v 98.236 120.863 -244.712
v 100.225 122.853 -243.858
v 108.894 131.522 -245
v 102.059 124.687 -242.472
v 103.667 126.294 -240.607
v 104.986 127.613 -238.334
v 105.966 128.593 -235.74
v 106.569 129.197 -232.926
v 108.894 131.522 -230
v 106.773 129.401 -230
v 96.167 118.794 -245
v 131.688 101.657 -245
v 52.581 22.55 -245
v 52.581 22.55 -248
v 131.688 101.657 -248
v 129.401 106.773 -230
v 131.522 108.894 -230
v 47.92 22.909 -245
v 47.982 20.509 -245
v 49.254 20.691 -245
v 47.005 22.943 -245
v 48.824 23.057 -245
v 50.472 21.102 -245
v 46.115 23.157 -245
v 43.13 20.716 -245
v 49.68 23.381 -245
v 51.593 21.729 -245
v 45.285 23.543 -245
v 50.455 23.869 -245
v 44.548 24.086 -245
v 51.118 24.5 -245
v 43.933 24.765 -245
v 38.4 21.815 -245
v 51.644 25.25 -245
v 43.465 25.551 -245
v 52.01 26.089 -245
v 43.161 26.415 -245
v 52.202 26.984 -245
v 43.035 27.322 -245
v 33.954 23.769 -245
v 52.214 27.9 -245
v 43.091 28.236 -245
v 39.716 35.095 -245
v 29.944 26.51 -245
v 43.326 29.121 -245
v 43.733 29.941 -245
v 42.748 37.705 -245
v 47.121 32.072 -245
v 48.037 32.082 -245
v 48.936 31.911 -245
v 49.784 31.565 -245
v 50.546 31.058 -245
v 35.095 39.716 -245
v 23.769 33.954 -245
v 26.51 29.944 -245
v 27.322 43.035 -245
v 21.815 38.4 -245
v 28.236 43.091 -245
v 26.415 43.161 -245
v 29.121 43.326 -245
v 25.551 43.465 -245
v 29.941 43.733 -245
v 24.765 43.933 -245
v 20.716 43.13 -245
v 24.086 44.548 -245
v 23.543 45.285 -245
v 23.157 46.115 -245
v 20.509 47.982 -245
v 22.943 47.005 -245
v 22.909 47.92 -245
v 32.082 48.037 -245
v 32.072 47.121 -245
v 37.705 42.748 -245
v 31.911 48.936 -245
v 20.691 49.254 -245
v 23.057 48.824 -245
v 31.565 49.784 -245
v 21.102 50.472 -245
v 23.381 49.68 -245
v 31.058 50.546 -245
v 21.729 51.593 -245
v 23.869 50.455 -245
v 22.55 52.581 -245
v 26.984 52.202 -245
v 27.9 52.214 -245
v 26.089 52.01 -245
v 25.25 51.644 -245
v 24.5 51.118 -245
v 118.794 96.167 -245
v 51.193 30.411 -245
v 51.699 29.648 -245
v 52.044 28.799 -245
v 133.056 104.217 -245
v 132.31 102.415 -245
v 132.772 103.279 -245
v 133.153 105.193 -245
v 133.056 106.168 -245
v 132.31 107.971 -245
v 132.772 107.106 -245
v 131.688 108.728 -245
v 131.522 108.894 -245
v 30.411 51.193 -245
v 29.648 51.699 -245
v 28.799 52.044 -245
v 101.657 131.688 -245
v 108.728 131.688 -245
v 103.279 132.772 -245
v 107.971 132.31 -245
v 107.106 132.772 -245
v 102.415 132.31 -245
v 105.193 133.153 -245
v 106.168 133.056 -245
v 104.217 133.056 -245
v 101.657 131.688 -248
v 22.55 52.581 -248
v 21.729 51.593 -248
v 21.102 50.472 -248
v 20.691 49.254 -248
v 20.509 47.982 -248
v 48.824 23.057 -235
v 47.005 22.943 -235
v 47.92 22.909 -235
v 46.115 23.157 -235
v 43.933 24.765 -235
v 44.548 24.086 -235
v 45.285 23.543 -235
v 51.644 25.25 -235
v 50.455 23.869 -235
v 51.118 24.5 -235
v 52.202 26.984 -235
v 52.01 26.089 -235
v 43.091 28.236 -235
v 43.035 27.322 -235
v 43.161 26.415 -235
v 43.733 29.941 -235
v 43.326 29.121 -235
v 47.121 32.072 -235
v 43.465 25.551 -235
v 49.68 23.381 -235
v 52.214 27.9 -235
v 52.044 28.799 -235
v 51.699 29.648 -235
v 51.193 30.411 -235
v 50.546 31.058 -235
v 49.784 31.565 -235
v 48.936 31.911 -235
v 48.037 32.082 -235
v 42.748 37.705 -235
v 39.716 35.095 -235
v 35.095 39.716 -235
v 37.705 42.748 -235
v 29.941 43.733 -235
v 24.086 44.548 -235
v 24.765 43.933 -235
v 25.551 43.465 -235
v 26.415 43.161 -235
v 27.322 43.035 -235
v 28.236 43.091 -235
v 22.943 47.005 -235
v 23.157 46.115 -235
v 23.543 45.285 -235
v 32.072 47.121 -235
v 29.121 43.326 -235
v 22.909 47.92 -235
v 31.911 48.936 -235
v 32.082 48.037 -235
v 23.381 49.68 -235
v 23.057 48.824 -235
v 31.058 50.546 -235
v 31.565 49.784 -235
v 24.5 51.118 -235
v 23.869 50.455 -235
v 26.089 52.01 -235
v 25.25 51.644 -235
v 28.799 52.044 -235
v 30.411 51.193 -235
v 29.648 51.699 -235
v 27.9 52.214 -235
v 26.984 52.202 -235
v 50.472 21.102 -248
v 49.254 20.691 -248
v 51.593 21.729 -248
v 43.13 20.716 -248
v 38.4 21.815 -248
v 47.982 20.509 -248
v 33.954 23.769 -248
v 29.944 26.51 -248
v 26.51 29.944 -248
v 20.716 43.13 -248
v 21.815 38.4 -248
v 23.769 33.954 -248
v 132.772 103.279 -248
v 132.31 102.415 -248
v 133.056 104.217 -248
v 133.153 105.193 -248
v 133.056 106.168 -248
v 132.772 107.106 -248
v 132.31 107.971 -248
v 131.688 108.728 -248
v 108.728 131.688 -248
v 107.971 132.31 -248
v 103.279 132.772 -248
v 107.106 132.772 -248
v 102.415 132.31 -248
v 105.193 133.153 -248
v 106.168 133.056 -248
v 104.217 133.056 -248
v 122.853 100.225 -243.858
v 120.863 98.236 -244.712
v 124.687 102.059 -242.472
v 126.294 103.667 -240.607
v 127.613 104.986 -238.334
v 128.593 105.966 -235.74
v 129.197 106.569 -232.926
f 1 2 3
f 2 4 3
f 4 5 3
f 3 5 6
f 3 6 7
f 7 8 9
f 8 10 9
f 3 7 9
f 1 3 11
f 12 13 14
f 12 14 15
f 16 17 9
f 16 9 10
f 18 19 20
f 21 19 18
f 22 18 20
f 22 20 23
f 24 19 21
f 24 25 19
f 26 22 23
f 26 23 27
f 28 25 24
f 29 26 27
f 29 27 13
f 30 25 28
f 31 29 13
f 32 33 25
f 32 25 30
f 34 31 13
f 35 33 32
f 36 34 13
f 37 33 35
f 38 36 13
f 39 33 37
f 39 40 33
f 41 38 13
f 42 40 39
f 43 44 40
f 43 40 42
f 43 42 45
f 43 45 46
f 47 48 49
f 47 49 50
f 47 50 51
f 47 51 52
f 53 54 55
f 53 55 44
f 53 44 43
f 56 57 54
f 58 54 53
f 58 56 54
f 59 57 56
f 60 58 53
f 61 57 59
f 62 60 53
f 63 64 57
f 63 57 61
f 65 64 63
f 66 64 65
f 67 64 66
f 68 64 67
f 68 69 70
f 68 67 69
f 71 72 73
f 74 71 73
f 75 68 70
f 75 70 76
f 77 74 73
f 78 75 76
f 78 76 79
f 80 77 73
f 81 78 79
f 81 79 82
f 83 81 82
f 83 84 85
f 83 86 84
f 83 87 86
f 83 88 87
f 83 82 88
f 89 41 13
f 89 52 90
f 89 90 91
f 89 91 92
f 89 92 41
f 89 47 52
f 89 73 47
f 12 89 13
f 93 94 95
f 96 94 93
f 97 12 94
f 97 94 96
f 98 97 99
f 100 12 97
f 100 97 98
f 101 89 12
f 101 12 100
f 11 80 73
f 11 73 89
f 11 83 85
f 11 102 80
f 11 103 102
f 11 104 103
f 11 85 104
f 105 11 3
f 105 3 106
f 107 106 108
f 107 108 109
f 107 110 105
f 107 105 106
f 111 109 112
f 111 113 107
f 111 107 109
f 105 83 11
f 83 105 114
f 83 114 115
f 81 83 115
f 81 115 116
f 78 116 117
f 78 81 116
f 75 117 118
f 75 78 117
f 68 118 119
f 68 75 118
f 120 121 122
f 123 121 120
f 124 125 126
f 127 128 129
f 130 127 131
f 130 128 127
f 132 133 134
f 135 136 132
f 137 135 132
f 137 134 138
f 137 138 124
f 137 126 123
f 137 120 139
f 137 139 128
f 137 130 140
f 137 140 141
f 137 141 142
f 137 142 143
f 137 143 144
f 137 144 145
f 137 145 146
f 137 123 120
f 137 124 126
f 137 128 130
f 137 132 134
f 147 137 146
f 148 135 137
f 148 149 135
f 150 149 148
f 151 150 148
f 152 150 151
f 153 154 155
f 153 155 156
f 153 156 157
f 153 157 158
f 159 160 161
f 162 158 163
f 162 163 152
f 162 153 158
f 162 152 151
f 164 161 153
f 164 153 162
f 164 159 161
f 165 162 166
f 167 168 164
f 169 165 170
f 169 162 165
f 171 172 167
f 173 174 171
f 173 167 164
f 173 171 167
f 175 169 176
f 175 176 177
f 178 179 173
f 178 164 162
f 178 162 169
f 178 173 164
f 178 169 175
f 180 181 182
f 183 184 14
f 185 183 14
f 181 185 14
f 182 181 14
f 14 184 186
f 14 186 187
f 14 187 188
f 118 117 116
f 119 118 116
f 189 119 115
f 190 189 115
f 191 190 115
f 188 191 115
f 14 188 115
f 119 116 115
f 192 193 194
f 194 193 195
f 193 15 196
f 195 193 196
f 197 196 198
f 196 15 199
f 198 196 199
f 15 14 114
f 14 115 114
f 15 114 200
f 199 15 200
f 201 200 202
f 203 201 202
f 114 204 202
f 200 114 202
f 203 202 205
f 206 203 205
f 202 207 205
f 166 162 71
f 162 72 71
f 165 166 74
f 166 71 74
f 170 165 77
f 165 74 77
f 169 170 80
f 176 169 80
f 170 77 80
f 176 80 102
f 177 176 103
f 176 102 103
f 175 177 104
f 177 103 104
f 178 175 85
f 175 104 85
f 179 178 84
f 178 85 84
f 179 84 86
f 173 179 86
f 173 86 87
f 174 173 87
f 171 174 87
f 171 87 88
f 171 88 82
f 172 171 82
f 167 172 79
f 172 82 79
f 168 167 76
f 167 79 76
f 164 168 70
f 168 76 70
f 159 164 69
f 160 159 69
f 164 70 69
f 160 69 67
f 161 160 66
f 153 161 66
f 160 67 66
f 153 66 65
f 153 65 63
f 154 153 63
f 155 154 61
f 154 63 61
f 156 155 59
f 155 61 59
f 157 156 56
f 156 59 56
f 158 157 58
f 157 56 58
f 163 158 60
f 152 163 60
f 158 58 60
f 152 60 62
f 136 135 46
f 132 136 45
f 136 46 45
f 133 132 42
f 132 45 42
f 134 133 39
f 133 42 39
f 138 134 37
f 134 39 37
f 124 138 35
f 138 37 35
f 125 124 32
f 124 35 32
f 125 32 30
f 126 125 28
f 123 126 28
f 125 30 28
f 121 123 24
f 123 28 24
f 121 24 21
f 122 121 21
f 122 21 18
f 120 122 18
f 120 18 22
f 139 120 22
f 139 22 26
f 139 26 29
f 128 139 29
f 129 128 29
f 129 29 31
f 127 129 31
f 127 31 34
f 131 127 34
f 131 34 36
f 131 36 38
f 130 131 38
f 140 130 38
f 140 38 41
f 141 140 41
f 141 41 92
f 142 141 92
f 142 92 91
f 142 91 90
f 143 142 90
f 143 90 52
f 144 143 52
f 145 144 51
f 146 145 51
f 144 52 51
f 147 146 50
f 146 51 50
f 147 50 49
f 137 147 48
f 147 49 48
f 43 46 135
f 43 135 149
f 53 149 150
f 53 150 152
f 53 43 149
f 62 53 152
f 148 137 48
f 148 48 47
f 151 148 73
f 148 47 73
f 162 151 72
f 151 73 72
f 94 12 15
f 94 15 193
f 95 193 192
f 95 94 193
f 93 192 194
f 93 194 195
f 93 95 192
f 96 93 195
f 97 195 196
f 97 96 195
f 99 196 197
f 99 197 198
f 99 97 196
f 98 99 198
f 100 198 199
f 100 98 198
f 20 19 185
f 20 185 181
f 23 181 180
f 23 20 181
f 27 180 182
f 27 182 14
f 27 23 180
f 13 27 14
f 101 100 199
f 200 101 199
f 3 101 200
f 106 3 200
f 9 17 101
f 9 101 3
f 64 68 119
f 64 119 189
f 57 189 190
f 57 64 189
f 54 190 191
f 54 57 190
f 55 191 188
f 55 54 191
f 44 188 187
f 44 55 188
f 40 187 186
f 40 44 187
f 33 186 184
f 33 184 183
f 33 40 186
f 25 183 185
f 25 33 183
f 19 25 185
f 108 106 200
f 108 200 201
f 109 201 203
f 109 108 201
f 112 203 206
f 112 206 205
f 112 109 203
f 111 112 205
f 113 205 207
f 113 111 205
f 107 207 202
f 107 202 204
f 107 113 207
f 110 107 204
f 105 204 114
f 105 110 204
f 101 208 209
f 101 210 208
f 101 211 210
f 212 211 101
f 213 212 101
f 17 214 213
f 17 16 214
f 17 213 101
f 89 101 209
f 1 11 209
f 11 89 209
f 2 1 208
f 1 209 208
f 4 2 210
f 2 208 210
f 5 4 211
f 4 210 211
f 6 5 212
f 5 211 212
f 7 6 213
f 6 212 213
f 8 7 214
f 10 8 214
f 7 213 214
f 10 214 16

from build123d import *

# Parameters (mm, degrees)
PAD033_DEPTH            = 3
SKETCH041_R             = 4.6
PAD032_DEPTH            = 10
PAD035_DEPTH            = 16
PAD036_DEPTH            = 10
BODY010_PLACEMENT_ANGLE = 45


with BuildPart() as part:
    # Sketch042 → Pad033 (new body)
    with BuildSketch(Plane.XY):
        with BuildLine():
            Line((165, 21.235047), (53.12592, 21.235047))
            ThreePointArc((53.12592, 21.235047), (50.610162, 20.767349), (48.43058, 19.42675))
            ThreePointArc((48.43058, 19.42675), (39.806811, 0), (48.43058, -19.42675))
            ThreePointArc((48.43058, -19.42675), (50.610162, -20.767349), (53.12592, -21.235047))
            Line((53.12592, -21.235047), (165, -21.235047))
            ThreePointArc((165, -21.235047), (168.535534, -19.770581), (170, -16.235047))
            Line((170, -16.235047), (170, 16.235047))
            ThreePointArc((170, 16.235047), (168.535534, 19.770581), (165, 21.235047))
        make_face()
    extrude(amount=-PAD033_DEPTH)

    # Sketch041 → Pad032 (join)
    with BuildSketch(Plane.XY):
        with Locations((53.12592, 14.235047)):
            Circle(SKETCH041_R)
        with Locations((53.12592, -14.235047)):
            Circle(SKETCH041_R)
    extrude(amount=PAD032_DEPTH)

    # Sketch045 → Pad035 (join, symmetric)
    with BuildSketch(Plane.XZ):
        with BuildLine():
            Line((170, 0), (170, 15))
            Line((170, 15), (167, 15))
            ThreePointArc((152, 0), (162.606602, 4.393398), (167, 15))
            Line((152, 0), (170, 0))
        make_face()
    extrude(amount=PAD035_DEPTH, both=True)

    # Sketch046 → Pad036 (join)
    with BuildSketch(Plane.XY):
        with BuildLine():
            ThreePointArc((55.057772, 14.752686), (52.608282, 16.166899), (51.194069, 13.717409))
            ThreePointArc((51.194069, -13.717409), (53, 0), (51.194069, 13.717409))
            ThreePointArc((51.194069, -13.717409), (52.608281, -16.166899), (55.057771, -14.752689))
            ThreePointArc((55.057771, -14.752689), (57, -2e-06), (55.057772, 14.752686))
        make_face()
    extrude(amount=PAD036_DEPTH)


with BuildPart() as part_1:
    # Body010 placement: moved
    add(part.part.moved(Location((0, 0, -245))).rotate(Axis((0, 0, -245), (0, 0, 1)), BODY010_PLACEMENT_ANGLE))


solid = part_1.part
